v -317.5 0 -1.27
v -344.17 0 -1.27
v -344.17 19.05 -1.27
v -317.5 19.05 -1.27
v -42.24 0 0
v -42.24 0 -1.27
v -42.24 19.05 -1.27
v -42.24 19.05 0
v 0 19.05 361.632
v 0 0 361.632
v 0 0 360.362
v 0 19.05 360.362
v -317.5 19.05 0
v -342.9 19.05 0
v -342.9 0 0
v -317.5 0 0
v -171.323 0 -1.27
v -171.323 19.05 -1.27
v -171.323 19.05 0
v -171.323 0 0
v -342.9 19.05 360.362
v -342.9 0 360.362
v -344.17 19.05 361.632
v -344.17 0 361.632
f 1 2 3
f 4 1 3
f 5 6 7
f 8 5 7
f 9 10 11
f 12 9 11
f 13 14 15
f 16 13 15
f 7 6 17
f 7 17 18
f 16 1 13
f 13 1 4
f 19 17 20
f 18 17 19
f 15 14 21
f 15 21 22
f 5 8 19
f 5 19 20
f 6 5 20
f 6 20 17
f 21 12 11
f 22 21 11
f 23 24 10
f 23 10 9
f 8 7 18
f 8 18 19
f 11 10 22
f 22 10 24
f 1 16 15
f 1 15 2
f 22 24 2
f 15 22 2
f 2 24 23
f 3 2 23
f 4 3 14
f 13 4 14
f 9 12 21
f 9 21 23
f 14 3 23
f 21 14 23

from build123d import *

# Parameters (mm, degrees)
SKETCH2_W     = 1.27
SKETCH2_H     = 19.05
SKETCH4_W     = 42.2402
SKETCH4_H     = 30.583151246
SKETCH4_W_2   = 146.177
SKETCH4_H_2   = 37.281519526
NOTCHES_DEPTH = 5.08


with BuildPart() as part:
    # L-Bracket: sweep along a path in Sketch3
    with BuildLine(Plane(origin=(0, 0, 0), x_dir=(1, 0, 0), z_dir=(0, 1, 0))) as l_bracket_path:
        Line((0, 0), (-342.9, 0))
        Line((-342.9, 0), (-342.9, -360.3625))
        Line((-342.9, -360.3625), (-146.05, -360.3625))
        Line((-146.05, -360.3625), (0, -360.3625))
    # Sketch2 → L-Bracket (sweep)
    with BuildSketch(Plane(origin=(0, 0, 0), x_dir=(0, 0, -1), z_dir=(1, 0, 0))):
        with Locations((0.635, 9.525)):
            Rectangle(SKETCH2_W, SKETCH2_H)
    sweep(path=l_bracket_path.line, transition=Transition.RIGHT)

    # Sketch4 → Notches (cut)
    with BuildSketch(Plane(origin=(0, 0, -1.27), x_dir=(-1, 0, 0), z_dir=(0, 0, -1))):
        with Locations((21.1201, 12.159570772)):
            Rectangle(SKETCH4_W, SKETCH4_H)
        with Locations((244.4115, 11.857544077)):
            Rectangle(SKETCH4_W_2, SKETCH4_H_2)
    extrude(amount=-NOTCHES_DEPTH, mode=Mode.SUBTRACT)


solid = part.part
